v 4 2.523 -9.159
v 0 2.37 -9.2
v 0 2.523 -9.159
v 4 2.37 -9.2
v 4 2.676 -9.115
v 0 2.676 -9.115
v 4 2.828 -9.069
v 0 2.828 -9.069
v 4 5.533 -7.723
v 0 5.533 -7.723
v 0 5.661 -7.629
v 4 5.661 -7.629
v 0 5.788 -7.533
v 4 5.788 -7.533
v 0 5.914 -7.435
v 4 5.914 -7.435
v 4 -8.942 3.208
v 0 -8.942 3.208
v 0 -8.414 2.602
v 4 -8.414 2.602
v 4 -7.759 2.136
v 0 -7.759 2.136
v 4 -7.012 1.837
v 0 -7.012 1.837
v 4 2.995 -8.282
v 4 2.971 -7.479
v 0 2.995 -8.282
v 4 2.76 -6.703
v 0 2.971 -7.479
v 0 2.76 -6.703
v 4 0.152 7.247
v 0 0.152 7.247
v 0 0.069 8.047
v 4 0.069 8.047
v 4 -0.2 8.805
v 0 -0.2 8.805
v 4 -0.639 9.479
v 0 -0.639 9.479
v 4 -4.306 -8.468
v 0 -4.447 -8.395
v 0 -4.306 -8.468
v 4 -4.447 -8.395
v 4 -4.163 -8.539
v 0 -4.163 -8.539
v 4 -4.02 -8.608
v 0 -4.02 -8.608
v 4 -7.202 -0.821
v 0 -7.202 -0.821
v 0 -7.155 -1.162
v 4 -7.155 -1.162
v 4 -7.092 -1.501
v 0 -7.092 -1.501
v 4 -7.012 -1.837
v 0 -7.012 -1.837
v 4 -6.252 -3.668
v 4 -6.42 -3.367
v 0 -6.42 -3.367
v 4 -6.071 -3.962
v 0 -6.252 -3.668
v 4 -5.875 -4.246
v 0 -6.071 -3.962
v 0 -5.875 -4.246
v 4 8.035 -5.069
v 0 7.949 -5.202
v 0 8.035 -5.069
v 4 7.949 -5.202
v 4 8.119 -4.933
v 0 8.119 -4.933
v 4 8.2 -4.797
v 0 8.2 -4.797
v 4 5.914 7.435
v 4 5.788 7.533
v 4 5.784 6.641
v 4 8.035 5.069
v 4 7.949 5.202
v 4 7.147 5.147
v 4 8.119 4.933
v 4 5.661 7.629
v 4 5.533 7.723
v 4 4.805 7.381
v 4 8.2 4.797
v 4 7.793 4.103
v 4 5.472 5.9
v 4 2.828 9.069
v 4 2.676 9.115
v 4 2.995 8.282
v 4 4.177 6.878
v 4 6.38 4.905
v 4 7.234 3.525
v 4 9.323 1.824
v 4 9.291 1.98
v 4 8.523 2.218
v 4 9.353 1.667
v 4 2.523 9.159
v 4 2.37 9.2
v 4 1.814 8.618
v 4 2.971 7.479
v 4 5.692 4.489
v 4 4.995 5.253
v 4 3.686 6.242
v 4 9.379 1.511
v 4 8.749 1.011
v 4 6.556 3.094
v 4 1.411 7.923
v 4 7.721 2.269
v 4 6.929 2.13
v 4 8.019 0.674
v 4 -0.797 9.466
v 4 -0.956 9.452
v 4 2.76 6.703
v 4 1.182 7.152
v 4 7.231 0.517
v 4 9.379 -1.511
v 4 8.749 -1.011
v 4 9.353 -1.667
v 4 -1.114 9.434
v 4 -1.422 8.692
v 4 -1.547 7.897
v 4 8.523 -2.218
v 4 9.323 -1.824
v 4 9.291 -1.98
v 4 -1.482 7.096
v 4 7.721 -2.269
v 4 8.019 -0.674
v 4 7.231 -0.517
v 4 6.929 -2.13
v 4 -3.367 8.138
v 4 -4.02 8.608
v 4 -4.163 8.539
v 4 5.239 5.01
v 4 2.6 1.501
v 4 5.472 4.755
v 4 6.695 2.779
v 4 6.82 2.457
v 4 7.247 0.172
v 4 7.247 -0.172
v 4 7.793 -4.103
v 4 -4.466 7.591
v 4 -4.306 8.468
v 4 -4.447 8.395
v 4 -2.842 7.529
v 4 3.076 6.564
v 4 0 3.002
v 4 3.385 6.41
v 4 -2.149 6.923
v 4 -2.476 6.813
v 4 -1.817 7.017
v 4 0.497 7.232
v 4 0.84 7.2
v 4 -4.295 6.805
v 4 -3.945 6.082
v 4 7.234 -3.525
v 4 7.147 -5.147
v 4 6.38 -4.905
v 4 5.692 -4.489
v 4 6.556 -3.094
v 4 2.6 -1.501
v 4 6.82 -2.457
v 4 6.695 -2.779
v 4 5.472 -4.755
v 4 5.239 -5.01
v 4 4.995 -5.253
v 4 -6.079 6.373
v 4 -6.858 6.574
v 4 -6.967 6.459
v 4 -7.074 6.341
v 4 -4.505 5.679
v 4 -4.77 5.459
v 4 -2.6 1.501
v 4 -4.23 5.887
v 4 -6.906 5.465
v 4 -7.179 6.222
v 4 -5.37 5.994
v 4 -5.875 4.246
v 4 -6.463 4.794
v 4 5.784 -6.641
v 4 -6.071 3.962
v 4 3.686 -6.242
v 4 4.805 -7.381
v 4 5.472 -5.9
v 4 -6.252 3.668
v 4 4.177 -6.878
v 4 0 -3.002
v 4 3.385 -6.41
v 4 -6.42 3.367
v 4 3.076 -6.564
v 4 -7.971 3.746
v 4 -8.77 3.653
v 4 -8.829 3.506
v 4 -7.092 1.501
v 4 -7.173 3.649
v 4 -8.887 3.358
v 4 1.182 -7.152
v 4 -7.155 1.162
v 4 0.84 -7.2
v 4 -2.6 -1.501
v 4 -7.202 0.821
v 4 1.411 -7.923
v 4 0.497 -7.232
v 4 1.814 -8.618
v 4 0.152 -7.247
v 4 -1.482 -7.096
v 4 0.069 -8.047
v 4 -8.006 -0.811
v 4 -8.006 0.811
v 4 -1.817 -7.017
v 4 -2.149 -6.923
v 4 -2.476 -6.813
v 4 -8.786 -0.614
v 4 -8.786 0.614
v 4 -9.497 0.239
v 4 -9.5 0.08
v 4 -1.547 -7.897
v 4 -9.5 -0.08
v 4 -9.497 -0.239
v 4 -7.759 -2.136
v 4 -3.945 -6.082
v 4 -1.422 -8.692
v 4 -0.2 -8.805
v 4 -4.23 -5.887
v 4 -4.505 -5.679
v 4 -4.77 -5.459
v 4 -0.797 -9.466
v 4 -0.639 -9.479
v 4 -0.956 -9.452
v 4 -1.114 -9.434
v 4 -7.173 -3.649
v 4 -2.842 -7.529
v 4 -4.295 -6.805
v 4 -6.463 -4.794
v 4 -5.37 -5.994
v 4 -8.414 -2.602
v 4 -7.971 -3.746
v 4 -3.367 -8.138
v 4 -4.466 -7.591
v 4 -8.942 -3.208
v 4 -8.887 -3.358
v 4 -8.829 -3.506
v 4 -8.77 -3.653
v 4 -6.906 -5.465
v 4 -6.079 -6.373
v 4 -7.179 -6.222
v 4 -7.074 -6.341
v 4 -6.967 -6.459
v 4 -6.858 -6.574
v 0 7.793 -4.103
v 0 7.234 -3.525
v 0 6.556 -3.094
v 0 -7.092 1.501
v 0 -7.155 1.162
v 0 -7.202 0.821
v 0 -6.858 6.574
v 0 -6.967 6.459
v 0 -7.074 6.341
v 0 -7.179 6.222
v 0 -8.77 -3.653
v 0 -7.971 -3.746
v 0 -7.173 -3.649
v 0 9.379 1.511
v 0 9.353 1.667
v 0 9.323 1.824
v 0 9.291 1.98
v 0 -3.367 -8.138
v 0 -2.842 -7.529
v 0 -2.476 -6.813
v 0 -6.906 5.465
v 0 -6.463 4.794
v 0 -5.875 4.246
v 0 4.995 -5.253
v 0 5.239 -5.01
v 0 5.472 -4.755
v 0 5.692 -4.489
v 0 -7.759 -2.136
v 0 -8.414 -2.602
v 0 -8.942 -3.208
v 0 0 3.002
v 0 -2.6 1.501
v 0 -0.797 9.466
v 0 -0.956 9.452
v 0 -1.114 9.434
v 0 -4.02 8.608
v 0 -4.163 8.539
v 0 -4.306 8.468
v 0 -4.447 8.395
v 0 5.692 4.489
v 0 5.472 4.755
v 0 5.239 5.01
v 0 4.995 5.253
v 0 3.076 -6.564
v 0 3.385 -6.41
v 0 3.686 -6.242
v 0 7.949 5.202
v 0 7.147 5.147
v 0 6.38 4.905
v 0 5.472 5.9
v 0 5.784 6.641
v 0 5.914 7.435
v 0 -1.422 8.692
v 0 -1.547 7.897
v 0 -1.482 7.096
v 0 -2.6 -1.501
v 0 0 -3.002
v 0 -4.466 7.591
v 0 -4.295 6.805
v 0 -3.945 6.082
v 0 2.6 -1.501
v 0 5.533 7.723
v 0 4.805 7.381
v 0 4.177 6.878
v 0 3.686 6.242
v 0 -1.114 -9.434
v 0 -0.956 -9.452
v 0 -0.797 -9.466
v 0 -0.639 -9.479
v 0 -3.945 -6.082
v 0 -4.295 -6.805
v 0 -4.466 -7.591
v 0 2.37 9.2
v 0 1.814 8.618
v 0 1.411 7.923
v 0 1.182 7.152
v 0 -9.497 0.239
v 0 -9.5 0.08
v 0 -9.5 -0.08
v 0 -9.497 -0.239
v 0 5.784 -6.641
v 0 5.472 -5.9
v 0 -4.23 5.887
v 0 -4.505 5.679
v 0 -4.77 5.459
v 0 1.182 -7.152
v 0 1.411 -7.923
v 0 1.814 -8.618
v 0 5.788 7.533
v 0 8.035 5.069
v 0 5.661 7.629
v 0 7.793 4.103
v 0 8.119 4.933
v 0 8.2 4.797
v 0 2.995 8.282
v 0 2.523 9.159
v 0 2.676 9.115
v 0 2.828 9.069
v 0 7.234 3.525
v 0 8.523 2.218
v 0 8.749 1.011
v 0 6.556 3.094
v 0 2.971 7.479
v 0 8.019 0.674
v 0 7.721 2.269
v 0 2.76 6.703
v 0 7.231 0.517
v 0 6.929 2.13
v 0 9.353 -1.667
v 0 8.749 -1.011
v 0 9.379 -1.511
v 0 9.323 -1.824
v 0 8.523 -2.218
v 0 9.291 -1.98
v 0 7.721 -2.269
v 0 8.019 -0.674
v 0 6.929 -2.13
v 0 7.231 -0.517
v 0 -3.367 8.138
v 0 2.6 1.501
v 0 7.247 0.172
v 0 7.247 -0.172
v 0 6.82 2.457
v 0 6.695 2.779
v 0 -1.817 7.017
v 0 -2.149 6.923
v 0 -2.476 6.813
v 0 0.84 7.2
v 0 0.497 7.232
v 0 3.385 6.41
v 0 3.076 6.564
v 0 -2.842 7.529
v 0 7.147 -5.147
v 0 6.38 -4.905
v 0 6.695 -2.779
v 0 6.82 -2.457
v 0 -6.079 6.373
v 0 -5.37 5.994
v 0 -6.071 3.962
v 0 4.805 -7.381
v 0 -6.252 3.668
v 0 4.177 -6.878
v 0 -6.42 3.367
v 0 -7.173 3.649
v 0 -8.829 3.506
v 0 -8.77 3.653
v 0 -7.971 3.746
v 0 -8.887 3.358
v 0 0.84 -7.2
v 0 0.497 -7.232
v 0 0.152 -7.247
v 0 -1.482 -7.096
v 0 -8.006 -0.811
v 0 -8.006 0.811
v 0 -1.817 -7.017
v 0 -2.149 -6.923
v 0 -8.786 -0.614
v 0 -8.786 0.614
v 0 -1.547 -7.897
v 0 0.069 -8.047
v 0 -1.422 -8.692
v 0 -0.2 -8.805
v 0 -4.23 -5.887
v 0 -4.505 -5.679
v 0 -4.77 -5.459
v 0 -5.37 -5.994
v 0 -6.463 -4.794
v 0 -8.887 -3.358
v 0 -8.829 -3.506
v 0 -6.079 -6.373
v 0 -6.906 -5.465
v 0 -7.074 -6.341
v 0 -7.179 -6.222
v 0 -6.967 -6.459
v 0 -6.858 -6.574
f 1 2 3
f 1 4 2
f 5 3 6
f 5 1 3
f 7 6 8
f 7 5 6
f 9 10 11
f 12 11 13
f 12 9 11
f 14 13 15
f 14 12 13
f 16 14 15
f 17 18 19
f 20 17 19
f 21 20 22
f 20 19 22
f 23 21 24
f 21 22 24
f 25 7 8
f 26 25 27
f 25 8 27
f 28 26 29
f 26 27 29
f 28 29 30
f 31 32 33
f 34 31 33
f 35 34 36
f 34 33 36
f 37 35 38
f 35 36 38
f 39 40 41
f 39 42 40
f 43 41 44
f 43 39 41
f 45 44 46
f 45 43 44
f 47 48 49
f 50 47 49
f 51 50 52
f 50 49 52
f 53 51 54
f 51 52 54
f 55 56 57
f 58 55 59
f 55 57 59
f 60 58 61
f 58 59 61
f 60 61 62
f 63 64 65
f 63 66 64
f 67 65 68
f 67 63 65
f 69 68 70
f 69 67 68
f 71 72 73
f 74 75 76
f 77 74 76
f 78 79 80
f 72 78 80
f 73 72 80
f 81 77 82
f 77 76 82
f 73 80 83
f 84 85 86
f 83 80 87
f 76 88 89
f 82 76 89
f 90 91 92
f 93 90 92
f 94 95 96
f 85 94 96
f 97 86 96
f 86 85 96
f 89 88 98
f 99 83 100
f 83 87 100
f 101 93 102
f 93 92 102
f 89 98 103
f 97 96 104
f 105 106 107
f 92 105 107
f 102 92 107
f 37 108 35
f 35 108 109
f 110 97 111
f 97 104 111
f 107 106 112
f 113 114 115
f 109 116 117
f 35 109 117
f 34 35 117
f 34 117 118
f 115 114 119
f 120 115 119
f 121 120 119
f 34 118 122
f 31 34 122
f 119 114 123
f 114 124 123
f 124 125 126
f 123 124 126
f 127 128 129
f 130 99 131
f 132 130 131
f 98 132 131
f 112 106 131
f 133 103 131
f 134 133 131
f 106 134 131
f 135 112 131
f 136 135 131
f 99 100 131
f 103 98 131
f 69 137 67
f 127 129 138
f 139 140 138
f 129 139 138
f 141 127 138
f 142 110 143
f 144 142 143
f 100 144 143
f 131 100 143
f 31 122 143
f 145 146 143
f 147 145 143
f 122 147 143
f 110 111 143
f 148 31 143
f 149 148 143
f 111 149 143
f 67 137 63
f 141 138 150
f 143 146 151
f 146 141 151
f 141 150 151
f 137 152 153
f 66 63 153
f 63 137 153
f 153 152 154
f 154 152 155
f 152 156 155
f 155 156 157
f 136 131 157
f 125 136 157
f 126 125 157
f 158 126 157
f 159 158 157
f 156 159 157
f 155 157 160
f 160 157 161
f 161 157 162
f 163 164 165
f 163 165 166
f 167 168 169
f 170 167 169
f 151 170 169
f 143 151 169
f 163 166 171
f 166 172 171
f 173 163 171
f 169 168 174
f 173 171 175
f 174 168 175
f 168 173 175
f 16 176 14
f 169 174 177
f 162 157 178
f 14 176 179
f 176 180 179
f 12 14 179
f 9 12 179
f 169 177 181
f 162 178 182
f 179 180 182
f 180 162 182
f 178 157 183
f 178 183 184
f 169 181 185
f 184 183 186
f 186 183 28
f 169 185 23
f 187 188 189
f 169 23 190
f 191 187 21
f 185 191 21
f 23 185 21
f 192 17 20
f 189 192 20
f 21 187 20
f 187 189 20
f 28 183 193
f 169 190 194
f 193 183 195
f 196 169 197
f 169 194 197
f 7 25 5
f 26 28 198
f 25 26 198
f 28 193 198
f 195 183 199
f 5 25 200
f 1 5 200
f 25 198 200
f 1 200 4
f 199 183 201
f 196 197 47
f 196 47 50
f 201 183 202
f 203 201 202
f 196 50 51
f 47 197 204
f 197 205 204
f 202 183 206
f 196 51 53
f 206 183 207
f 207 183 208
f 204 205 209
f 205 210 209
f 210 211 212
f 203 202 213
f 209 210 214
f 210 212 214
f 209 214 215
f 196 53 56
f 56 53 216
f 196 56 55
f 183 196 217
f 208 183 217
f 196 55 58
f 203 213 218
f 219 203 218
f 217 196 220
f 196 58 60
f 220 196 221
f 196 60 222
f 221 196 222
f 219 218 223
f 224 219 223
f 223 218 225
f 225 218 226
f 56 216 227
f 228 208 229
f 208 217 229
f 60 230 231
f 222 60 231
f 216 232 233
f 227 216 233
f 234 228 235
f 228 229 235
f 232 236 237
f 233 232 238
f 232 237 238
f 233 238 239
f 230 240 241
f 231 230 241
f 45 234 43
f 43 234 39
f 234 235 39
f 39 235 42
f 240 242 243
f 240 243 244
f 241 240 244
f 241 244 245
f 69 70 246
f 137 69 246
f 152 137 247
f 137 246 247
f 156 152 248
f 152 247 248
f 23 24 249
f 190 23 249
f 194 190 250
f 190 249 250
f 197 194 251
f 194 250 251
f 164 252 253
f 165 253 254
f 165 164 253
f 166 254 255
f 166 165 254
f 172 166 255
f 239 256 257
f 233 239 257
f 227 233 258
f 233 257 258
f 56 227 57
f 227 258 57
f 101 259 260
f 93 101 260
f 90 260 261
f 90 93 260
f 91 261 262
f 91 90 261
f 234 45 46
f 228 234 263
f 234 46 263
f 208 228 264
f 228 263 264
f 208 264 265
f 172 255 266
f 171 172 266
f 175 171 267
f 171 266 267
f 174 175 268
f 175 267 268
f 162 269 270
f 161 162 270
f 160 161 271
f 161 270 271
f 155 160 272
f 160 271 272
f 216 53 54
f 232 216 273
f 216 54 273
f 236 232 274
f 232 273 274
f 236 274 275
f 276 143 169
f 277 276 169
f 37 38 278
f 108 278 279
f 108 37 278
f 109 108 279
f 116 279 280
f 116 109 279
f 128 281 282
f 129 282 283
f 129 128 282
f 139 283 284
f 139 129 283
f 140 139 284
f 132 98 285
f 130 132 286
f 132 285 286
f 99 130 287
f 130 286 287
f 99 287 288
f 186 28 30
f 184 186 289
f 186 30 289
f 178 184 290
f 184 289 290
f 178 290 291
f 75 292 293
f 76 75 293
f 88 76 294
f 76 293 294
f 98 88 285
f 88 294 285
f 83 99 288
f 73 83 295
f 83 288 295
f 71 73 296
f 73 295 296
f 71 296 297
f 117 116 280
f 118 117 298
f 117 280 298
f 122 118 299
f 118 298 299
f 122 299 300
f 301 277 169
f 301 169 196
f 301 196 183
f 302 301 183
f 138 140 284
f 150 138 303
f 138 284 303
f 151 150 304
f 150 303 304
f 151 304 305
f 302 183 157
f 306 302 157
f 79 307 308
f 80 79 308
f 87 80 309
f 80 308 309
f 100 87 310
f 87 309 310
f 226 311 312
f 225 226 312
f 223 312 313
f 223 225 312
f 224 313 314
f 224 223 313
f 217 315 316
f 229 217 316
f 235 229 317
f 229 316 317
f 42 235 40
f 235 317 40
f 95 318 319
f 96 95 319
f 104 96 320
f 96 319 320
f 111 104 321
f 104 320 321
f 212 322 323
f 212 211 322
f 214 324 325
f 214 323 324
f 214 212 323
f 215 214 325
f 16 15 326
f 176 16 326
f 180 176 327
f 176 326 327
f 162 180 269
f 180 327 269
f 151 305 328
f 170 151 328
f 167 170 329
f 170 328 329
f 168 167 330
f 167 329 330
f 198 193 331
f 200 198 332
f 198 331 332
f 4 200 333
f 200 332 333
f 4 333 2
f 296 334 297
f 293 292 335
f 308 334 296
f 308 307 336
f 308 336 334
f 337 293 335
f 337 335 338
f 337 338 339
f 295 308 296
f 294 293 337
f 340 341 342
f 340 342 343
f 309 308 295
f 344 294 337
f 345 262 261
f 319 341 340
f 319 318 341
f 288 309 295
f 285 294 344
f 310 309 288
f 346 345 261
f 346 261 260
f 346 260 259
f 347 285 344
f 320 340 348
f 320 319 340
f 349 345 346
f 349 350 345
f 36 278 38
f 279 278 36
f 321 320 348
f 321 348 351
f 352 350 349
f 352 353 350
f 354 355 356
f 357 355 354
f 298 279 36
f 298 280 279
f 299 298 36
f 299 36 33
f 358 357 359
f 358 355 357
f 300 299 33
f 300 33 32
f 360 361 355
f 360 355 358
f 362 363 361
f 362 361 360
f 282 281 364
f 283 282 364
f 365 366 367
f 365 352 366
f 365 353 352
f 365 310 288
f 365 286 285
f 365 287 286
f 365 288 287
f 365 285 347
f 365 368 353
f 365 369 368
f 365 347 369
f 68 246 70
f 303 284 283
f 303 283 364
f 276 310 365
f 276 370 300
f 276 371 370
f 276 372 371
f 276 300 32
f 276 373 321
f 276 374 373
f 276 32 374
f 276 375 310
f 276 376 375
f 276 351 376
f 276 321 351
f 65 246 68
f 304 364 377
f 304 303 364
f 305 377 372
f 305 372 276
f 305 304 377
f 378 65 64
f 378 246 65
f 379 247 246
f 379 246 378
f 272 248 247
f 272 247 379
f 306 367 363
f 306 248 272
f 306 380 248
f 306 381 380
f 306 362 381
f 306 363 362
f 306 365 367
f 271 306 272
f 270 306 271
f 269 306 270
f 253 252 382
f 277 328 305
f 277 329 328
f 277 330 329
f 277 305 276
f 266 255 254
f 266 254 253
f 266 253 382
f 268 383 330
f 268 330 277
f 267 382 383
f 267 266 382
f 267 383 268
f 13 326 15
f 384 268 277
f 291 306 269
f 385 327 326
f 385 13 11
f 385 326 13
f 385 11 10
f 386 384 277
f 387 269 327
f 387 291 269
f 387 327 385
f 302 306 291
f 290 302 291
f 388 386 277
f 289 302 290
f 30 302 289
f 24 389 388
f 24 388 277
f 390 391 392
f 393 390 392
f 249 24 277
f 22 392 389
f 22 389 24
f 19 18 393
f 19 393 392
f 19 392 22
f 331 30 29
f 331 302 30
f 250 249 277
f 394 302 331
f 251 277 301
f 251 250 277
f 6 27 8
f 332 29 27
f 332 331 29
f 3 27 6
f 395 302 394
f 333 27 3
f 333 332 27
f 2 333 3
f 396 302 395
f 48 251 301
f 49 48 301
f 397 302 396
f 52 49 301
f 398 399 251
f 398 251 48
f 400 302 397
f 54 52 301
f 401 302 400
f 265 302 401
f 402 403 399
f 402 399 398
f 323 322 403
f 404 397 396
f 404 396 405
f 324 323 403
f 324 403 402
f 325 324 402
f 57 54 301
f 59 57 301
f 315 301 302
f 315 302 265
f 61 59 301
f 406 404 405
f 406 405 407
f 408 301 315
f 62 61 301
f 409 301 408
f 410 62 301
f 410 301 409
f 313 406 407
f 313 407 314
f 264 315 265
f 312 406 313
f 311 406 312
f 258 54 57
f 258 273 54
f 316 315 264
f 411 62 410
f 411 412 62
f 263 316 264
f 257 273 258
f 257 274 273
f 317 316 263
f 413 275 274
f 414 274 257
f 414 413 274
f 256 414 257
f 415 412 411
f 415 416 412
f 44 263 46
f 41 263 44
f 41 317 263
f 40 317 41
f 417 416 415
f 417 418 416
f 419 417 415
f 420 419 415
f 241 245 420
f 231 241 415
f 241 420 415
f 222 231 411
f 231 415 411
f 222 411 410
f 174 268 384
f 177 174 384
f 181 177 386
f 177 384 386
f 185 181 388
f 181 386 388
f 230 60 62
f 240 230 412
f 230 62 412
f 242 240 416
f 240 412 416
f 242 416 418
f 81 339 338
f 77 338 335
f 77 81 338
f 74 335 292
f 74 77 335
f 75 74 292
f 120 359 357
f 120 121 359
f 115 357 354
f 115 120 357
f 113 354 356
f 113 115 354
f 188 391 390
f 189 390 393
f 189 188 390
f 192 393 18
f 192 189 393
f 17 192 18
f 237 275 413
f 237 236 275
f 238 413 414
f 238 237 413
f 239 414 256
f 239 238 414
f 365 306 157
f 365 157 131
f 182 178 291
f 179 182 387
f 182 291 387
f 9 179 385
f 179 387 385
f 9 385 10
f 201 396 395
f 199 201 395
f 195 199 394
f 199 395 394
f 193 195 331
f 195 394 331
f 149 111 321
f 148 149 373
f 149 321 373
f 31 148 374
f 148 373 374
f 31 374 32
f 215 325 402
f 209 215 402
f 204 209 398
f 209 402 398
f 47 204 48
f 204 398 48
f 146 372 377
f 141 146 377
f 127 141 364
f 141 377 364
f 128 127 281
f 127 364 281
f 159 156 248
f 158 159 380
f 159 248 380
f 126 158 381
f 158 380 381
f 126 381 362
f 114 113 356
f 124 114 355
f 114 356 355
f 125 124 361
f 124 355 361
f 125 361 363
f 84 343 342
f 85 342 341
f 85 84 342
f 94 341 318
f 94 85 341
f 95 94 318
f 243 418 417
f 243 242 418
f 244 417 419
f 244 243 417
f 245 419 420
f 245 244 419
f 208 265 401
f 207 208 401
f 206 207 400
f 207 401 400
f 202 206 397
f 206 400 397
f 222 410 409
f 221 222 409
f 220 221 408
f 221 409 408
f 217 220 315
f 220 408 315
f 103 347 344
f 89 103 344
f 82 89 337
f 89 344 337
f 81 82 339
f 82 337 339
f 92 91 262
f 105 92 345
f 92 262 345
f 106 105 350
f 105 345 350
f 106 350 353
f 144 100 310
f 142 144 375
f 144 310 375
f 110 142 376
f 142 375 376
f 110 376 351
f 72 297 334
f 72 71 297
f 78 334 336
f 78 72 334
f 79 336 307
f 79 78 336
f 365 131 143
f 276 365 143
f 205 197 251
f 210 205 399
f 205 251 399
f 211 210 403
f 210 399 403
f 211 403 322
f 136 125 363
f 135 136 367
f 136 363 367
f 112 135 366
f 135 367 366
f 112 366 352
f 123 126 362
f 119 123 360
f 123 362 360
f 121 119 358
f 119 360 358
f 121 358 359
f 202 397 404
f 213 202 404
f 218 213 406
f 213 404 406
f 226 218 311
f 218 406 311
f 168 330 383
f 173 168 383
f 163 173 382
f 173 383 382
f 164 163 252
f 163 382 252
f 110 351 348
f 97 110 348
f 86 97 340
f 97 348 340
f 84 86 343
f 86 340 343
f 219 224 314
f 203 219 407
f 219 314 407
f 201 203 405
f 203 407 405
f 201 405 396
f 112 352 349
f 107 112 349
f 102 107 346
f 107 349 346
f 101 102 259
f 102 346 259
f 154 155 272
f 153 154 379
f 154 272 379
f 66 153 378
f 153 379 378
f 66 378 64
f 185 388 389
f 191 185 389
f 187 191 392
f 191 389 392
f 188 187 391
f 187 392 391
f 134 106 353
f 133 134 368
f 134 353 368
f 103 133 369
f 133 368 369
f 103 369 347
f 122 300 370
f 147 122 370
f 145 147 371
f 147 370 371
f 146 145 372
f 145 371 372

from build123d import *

# Parameters (mm, degrees)
BASPROSKE_W        = 4
BASPROSKE_H        = 9.5
TOOTHCUT_DEPTH     = 15.017845769
TEETHCUTS_COUNT    = 17
TEETHCUTS_ANGLE    = 338.823529412
BORSKE_R           = 0.4
BORE_DEPTH         = 50.0000508
CUT_EXTRUDE1_DEPTH = 15.003283988


with BuildPart() as part:
    # BasProSke → Base-Revolve (revolve)
    with BuildSketch(Plane(origin=(0, 0, 0), x_dir=(1, 0, 0), z_dir=(0, 1, 0)), mode=Mode.PRIVATE) as base_revolve_sk:
        with Locations((2, 4.75)):
            Rectangle(BASPROSKE_W, BASPROSKE_H)
    revolve(base_revolve_sk.sketch.rotate(Axis((-10, 0, 0), (1, 0, 0)), 180), axis=Axis((-10, 0, 0), (1, 0, 0)))

    # TooCutSke → ToothCut (cut, through all)
    with BuildSketch(Plane(origin=(0, 0, 0), x_dir=(0, 0, -1), z_dir=(1, 0, 0))):
        with BuildLine():
            ThreePointArc((0.516861231, 7.23055015), (0, 7.249), (-0.516861231, 7.23055015))
            ThreePointArc((-0.516861231, 7.23055015), (-0.827352654, 8.408398361), (-1.533069197, 9.401220346))
            ThreePointArc((-1.533069197, 9.401220346), (0, 9.5254), (1.533069197, 9.401220346))
            ThreePointArc((1.533069197, 9.401220346), (0.827352654, 8.408398361), (0.516861231, 7.23055015))
        make_face()
    toothcut = extrude(amount=TOOTHCUT_DEPTH, mode=Mode.SUBTRACT)

    # TeethCuts: ToothCut ×17 about axis
    teethcuts_axis = Axis((-10, 0, 0), (1, 0, 0))
    for i in range(1, TEETHCUTS_COUNT):
        add(toothcut.rotate(teethcuts_axis, i * TEETHCUTS_ANGLE / (TEETHCUTS_COUNT - 1)), mode=Mode.SUBTRACT)

    # BorSke → Bore (cut, symmetric)
    with BuildSketch(Plane(origin=(0, 0, 0), x_dir=(0, 0, -1), z_dir=(1, 0, 0))):
        with Locations(Location((0, 0, 0), (0, 0, 180))):
            Circle(BORSKE_R)
    extrude(amount=BORE_DEPTH, both=True, mode=Mode.SUBTRACT)

    # Sketch1 → Cut-Extrude1 (cut, through all)
    with BuildSketch(Plane(origin=(4, 0, 0), x_dir=(0, 0, -1), z_dir=(1, 0, 0))):
        Polygon((3.0022214, 0), (1.5011107, 2.6), (-1.5011107, 2.6), (-3.0022214, 0), (-1.5011107, -2.6), (1.5011107, -2.6), align=None)
    extrude(amount=-CUT_EXTRUDE1_DEPTH, mode=Mode.SUBTRACT)


solid = part.part
